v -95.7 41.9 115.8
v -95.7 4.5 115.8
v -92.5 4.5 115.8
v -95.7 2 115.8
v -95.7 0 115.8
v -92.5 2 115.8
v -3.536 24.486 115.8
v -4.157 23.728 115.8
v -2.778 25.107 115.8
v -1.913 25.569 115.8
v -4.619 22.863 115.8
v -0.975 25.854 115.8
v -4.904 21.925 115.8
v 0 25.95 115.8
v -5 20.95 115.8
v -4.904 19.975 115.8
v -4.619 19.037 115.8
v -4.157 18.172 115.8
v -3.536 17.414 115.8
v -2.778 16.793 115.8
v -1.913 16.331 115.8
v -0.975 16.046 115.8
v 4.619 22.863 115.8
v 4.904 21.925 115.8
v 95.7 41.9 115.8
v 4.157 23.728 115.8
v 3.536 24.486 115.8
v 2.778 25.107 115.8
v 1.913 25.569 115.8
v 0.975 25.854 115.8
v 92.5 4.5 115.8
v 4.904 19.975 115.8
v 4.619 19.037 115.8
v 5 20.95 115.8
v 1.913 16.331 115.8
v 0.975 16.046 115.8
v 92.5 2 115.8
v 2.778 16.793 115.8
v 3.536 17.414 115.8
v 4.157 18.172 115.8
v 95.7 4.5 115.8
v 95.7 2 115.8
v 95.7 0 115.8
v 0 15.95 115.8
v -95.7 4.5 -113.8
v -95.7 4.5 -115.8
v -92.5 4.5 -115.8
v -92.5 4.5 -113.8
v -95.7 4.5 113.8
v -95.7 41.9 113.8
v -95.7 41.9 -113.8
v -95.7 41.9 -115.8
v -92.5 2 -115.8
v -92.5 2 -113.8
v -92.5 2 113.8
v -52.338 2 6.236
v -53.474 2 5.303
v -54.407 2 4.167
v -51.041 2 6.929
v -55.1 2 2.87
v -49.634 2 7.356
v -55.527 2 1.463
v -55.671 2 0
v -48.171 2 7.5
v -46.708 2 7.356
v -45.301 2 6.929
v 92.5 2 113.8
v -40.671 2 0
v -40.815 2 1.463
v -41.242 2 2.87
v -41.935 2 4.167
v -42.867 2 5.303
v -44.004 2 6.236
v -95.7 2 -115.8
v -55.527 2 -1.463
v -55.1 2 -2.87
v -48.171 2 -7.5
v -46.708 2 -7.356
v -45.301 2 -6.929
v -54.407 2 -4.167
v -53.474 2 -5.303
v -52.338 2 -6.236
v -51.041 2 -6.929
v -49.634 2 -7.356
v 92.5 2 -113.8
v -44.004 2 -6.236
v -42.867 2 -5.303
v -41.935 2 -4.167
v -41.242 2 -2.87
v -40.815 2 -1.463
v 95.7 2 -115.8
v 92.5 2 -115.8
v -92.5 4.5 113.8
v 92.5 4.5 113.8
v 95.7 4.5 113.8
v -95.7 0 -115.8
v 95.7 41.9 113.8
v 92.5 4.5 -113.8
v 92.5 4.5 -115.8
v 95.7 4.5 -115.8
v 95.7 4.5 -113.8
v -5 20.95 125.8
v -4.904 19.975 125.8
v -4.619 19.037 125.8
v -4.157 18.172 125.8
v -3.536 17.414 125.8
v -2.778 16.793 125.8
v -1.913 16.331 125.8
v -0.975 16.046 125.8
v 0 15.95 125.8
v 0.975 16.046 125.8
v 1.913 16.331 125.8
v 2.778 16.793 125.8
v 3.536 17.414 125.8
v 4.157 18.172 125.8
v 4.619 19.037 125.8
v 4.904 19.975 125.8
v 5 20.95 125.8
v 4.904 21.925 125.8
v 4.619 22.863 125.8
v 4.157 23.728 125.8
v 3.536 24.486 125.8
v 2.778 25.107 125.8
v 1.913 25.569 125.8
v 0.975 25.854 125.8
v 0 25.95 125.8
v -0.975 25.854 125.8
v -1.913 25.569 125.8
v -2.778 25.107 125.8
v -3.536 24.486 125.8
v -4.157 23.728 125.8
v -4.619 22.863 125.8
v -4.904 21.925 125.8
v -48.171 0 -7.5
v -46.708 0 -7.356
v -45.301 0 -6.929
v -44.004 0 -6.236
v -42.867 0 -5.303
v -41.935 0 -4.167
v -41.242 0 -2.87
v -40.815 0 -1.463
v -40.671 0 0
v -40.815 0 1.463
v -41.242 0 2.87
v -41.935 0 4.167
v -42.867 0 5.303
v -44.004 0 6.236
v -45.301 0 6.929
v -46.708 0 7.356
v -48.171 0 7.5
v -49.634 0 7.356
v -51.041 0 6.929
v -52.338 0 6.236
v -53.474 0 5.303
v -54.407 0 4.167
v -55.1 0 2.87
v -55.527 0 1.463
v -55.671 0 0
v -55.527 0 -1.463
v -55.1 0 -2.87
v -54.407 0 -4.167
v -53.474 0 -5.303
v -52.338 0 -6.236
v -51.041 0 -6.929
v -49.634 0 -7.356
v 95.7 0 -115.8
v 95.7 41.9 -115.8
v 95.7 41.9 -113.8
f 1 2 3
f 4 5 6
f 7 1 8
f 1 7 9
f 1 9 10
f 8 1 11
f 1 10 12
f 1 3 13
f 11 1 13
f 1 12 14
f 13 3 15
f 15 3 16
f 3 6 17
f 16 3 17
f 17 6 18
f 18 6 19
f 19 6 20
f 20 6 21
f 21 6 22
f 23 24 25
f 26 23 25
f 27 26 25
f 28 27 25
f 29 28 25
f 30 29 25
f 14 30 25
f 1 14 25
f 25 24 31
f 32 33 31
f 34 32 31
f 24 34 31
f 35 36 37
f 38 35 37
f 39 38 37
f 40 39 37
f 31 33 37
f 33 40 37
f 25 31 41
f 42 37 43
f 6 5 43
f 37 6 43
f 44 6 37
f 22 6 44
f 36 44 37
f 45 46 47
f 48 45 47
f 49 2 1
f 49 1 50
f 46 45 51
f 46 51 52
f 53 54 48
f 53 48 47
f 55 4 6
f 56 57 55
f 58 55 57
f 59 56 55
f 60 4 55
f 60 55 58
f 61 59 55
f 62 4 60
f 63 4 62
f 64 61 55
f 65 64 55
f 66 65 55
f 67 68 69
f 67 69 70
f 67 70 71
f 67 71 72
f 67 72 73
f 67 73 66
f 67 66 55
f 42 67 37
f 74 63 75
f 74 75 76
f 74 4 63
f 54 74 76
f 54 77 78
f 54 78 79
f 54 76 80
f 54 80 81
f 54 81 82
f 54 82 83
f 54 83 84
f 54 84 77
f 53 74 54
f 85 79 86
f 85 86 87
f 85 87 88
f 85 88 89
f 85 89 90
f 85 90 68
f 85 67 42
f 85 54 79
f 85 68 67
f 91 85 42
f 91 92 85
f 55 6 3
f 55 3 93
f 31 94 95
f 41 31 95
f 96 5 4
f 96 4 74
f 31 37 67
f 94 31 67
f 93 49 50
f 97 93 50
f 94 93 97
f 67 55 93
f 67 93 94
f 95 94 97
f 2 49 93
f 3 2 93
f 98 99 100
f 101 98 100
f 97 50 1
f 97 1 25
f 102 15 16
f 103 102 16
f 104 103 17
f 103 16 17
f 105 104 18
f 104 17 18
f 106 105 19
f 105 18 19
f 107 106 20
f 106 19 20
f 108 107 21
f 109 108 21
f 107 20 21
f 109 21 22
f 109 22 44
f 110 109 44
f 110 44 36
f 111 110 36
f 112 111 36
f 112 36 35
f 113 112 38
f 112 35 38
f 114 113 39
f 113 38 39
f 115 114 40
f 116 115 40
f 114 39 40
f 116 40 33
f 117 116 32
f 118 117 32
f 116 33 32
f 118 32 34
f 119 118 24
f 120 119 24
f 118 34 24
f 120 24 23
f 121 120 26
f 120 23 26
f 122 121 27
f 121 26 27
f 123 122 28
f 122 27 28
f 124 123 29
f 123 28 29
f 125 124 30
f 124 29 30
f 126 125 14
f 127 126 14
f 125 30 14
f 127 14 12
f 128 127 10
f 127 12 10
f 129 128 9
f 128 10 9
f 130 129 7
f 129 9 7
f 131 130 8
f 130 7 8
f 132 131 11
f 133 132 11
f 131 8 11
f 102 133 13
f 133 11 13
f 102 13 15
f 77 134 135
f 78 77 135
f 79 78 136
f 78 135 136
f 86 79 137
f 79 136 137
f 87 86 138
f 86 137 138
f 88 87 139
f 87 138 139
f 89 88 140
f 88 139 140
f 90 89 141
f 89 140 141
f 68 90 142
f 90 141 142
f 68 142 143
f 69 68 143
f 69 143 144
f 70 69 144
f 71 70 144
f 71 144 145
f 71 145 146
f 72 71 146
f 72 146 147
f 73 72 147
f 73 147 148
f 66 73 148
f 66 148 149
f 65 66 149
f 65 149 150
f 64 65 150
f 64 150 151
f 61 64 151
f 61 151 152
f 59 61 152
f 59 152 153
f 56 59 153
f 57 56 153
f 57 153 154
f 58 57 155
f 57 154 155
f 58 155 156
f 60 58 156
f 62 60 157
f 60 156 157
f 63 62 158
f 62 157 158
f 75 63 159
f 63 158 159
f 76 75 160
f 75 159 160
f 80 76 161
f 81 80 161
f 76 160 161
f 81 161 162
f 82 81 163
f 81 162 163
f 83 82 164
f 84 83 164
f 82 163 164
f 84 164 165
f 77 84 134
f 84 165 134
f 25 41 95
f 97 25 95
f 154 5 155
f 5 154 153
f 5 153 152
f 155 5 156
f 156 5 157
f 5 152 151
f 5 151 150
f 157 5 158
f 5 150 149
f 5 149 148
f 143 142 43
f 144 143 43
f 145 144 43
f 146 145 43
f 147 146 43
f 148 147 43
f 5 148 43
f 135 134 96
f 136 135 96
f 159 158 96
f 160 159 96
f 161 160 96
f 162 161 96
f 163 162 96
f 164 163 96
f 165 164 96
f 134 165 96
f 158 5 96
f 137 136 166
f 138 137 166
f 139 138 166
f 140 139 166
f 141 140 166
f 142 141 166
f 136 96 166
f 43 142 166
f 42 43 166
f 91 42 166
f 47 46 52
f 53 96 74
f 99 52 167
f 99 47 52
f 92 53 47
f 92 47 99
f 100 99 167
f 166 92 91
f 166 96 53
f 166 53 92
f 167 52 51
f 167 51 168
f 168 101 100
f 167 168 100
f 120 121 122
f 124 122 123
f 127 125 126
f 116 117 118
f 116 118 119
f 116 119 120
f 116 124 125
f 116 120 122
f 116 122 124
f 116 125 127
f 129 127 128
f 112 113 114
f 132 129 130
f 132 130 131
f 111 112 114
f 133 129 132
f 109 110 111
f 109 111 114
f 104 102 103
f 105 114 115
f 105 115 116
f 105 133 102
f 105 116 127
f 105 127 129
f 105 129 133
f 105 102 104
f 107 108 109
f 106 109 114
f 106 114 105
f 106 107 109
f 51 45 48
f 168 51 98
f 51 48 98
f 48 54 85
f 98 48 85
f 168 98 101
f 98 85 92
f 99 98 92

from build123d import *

# Parameters (mm, degrees)
SKETCH_2_W         = 191.4
SKETCH_2_H         = 231.6
EXTRUDE_1_DEPTH    = 2
SKETCH_3_W         = 185
SKETCH_3_H         = 2
EXTRUDE_2_DEPTH    = 2.5
SKETCH_4_W         = 191.4
SKETCH_4_H         = 2
EXTRUDE_3_DEPTH    = 37.4
SKETCH_7_R         = 5
EXTRUDE_5_DEPTH    = 10
SKETCH1_R          = 7.5
CUT_EXTRUDE1_DEPTH = 10


with BuildPart() as part:
    # 草图2 → 凸台-拉伸1 (new body)
    with BuildSketch(Plane(origin=(0, 0, 0), x_dir=(1, 0, 0), z_dir=(0, 1, 0))):
        Rectangle(SKETCH_2_W, SKETCH_2_H)
    extrude(amount=EXTRUDE_1_DEPTH)

    # 草图3 → 凸台-拉伸2 (add)
    with BuildSketch(Plane(origin=(0, 2, 0), x_dir=(1, 0, 0), z_dir=(0, 1, 0))):
        with Locations((0, 114.8)):
            Rectangle(SKETCH_3_W, SKETCH_3_H)
        with Locations((0, -114.8)):
            Rectangle(SKETCH_3_W, SKETCH_3_H)
    extrude(amount=EXTRUDE_2_DEPTH)

    # 草图4 → 凸台-拉伸3 (add)
    with BuildSketch(Plane(origin=(0, 4.5, 0), x_dir=(1, 0, 0), z_dir=(0, 1, 0))):
        with Locations((0, 114.8)):
            Rectangle(SKETCH_4_W, SKETCH_4_H)
        with Locations((0, -114.8)):
            Rectangle(SKETCH_4_W, SKETCH_4_H)
    extrude(amount=EXTRUDE_3_DEPTH)

    # 草图7 → 凸台-拉伸5 (add)
    with BuildSketch(Plane.XY.offset(115.8)):
        with Locations(Location((0, 20.95, 0), (0, 0, 180))):
            Circle(SKETCH_7_R)
    extrude(amount=EXTRUDE_5_DEPTH)

    # Sketch1 → Cut-Extrude1 (cut)
    with BuildSketch(Plane.XZ):
        with Locations(Location((-48.170733531, 0, 0), (0, 0, 270))):
            Circle(SKETCH1_R)
    extrude(amount=-CUT_EXTRUDE1_DEPTH, mode=Mode.SUBTRACT)


solid = part.part
